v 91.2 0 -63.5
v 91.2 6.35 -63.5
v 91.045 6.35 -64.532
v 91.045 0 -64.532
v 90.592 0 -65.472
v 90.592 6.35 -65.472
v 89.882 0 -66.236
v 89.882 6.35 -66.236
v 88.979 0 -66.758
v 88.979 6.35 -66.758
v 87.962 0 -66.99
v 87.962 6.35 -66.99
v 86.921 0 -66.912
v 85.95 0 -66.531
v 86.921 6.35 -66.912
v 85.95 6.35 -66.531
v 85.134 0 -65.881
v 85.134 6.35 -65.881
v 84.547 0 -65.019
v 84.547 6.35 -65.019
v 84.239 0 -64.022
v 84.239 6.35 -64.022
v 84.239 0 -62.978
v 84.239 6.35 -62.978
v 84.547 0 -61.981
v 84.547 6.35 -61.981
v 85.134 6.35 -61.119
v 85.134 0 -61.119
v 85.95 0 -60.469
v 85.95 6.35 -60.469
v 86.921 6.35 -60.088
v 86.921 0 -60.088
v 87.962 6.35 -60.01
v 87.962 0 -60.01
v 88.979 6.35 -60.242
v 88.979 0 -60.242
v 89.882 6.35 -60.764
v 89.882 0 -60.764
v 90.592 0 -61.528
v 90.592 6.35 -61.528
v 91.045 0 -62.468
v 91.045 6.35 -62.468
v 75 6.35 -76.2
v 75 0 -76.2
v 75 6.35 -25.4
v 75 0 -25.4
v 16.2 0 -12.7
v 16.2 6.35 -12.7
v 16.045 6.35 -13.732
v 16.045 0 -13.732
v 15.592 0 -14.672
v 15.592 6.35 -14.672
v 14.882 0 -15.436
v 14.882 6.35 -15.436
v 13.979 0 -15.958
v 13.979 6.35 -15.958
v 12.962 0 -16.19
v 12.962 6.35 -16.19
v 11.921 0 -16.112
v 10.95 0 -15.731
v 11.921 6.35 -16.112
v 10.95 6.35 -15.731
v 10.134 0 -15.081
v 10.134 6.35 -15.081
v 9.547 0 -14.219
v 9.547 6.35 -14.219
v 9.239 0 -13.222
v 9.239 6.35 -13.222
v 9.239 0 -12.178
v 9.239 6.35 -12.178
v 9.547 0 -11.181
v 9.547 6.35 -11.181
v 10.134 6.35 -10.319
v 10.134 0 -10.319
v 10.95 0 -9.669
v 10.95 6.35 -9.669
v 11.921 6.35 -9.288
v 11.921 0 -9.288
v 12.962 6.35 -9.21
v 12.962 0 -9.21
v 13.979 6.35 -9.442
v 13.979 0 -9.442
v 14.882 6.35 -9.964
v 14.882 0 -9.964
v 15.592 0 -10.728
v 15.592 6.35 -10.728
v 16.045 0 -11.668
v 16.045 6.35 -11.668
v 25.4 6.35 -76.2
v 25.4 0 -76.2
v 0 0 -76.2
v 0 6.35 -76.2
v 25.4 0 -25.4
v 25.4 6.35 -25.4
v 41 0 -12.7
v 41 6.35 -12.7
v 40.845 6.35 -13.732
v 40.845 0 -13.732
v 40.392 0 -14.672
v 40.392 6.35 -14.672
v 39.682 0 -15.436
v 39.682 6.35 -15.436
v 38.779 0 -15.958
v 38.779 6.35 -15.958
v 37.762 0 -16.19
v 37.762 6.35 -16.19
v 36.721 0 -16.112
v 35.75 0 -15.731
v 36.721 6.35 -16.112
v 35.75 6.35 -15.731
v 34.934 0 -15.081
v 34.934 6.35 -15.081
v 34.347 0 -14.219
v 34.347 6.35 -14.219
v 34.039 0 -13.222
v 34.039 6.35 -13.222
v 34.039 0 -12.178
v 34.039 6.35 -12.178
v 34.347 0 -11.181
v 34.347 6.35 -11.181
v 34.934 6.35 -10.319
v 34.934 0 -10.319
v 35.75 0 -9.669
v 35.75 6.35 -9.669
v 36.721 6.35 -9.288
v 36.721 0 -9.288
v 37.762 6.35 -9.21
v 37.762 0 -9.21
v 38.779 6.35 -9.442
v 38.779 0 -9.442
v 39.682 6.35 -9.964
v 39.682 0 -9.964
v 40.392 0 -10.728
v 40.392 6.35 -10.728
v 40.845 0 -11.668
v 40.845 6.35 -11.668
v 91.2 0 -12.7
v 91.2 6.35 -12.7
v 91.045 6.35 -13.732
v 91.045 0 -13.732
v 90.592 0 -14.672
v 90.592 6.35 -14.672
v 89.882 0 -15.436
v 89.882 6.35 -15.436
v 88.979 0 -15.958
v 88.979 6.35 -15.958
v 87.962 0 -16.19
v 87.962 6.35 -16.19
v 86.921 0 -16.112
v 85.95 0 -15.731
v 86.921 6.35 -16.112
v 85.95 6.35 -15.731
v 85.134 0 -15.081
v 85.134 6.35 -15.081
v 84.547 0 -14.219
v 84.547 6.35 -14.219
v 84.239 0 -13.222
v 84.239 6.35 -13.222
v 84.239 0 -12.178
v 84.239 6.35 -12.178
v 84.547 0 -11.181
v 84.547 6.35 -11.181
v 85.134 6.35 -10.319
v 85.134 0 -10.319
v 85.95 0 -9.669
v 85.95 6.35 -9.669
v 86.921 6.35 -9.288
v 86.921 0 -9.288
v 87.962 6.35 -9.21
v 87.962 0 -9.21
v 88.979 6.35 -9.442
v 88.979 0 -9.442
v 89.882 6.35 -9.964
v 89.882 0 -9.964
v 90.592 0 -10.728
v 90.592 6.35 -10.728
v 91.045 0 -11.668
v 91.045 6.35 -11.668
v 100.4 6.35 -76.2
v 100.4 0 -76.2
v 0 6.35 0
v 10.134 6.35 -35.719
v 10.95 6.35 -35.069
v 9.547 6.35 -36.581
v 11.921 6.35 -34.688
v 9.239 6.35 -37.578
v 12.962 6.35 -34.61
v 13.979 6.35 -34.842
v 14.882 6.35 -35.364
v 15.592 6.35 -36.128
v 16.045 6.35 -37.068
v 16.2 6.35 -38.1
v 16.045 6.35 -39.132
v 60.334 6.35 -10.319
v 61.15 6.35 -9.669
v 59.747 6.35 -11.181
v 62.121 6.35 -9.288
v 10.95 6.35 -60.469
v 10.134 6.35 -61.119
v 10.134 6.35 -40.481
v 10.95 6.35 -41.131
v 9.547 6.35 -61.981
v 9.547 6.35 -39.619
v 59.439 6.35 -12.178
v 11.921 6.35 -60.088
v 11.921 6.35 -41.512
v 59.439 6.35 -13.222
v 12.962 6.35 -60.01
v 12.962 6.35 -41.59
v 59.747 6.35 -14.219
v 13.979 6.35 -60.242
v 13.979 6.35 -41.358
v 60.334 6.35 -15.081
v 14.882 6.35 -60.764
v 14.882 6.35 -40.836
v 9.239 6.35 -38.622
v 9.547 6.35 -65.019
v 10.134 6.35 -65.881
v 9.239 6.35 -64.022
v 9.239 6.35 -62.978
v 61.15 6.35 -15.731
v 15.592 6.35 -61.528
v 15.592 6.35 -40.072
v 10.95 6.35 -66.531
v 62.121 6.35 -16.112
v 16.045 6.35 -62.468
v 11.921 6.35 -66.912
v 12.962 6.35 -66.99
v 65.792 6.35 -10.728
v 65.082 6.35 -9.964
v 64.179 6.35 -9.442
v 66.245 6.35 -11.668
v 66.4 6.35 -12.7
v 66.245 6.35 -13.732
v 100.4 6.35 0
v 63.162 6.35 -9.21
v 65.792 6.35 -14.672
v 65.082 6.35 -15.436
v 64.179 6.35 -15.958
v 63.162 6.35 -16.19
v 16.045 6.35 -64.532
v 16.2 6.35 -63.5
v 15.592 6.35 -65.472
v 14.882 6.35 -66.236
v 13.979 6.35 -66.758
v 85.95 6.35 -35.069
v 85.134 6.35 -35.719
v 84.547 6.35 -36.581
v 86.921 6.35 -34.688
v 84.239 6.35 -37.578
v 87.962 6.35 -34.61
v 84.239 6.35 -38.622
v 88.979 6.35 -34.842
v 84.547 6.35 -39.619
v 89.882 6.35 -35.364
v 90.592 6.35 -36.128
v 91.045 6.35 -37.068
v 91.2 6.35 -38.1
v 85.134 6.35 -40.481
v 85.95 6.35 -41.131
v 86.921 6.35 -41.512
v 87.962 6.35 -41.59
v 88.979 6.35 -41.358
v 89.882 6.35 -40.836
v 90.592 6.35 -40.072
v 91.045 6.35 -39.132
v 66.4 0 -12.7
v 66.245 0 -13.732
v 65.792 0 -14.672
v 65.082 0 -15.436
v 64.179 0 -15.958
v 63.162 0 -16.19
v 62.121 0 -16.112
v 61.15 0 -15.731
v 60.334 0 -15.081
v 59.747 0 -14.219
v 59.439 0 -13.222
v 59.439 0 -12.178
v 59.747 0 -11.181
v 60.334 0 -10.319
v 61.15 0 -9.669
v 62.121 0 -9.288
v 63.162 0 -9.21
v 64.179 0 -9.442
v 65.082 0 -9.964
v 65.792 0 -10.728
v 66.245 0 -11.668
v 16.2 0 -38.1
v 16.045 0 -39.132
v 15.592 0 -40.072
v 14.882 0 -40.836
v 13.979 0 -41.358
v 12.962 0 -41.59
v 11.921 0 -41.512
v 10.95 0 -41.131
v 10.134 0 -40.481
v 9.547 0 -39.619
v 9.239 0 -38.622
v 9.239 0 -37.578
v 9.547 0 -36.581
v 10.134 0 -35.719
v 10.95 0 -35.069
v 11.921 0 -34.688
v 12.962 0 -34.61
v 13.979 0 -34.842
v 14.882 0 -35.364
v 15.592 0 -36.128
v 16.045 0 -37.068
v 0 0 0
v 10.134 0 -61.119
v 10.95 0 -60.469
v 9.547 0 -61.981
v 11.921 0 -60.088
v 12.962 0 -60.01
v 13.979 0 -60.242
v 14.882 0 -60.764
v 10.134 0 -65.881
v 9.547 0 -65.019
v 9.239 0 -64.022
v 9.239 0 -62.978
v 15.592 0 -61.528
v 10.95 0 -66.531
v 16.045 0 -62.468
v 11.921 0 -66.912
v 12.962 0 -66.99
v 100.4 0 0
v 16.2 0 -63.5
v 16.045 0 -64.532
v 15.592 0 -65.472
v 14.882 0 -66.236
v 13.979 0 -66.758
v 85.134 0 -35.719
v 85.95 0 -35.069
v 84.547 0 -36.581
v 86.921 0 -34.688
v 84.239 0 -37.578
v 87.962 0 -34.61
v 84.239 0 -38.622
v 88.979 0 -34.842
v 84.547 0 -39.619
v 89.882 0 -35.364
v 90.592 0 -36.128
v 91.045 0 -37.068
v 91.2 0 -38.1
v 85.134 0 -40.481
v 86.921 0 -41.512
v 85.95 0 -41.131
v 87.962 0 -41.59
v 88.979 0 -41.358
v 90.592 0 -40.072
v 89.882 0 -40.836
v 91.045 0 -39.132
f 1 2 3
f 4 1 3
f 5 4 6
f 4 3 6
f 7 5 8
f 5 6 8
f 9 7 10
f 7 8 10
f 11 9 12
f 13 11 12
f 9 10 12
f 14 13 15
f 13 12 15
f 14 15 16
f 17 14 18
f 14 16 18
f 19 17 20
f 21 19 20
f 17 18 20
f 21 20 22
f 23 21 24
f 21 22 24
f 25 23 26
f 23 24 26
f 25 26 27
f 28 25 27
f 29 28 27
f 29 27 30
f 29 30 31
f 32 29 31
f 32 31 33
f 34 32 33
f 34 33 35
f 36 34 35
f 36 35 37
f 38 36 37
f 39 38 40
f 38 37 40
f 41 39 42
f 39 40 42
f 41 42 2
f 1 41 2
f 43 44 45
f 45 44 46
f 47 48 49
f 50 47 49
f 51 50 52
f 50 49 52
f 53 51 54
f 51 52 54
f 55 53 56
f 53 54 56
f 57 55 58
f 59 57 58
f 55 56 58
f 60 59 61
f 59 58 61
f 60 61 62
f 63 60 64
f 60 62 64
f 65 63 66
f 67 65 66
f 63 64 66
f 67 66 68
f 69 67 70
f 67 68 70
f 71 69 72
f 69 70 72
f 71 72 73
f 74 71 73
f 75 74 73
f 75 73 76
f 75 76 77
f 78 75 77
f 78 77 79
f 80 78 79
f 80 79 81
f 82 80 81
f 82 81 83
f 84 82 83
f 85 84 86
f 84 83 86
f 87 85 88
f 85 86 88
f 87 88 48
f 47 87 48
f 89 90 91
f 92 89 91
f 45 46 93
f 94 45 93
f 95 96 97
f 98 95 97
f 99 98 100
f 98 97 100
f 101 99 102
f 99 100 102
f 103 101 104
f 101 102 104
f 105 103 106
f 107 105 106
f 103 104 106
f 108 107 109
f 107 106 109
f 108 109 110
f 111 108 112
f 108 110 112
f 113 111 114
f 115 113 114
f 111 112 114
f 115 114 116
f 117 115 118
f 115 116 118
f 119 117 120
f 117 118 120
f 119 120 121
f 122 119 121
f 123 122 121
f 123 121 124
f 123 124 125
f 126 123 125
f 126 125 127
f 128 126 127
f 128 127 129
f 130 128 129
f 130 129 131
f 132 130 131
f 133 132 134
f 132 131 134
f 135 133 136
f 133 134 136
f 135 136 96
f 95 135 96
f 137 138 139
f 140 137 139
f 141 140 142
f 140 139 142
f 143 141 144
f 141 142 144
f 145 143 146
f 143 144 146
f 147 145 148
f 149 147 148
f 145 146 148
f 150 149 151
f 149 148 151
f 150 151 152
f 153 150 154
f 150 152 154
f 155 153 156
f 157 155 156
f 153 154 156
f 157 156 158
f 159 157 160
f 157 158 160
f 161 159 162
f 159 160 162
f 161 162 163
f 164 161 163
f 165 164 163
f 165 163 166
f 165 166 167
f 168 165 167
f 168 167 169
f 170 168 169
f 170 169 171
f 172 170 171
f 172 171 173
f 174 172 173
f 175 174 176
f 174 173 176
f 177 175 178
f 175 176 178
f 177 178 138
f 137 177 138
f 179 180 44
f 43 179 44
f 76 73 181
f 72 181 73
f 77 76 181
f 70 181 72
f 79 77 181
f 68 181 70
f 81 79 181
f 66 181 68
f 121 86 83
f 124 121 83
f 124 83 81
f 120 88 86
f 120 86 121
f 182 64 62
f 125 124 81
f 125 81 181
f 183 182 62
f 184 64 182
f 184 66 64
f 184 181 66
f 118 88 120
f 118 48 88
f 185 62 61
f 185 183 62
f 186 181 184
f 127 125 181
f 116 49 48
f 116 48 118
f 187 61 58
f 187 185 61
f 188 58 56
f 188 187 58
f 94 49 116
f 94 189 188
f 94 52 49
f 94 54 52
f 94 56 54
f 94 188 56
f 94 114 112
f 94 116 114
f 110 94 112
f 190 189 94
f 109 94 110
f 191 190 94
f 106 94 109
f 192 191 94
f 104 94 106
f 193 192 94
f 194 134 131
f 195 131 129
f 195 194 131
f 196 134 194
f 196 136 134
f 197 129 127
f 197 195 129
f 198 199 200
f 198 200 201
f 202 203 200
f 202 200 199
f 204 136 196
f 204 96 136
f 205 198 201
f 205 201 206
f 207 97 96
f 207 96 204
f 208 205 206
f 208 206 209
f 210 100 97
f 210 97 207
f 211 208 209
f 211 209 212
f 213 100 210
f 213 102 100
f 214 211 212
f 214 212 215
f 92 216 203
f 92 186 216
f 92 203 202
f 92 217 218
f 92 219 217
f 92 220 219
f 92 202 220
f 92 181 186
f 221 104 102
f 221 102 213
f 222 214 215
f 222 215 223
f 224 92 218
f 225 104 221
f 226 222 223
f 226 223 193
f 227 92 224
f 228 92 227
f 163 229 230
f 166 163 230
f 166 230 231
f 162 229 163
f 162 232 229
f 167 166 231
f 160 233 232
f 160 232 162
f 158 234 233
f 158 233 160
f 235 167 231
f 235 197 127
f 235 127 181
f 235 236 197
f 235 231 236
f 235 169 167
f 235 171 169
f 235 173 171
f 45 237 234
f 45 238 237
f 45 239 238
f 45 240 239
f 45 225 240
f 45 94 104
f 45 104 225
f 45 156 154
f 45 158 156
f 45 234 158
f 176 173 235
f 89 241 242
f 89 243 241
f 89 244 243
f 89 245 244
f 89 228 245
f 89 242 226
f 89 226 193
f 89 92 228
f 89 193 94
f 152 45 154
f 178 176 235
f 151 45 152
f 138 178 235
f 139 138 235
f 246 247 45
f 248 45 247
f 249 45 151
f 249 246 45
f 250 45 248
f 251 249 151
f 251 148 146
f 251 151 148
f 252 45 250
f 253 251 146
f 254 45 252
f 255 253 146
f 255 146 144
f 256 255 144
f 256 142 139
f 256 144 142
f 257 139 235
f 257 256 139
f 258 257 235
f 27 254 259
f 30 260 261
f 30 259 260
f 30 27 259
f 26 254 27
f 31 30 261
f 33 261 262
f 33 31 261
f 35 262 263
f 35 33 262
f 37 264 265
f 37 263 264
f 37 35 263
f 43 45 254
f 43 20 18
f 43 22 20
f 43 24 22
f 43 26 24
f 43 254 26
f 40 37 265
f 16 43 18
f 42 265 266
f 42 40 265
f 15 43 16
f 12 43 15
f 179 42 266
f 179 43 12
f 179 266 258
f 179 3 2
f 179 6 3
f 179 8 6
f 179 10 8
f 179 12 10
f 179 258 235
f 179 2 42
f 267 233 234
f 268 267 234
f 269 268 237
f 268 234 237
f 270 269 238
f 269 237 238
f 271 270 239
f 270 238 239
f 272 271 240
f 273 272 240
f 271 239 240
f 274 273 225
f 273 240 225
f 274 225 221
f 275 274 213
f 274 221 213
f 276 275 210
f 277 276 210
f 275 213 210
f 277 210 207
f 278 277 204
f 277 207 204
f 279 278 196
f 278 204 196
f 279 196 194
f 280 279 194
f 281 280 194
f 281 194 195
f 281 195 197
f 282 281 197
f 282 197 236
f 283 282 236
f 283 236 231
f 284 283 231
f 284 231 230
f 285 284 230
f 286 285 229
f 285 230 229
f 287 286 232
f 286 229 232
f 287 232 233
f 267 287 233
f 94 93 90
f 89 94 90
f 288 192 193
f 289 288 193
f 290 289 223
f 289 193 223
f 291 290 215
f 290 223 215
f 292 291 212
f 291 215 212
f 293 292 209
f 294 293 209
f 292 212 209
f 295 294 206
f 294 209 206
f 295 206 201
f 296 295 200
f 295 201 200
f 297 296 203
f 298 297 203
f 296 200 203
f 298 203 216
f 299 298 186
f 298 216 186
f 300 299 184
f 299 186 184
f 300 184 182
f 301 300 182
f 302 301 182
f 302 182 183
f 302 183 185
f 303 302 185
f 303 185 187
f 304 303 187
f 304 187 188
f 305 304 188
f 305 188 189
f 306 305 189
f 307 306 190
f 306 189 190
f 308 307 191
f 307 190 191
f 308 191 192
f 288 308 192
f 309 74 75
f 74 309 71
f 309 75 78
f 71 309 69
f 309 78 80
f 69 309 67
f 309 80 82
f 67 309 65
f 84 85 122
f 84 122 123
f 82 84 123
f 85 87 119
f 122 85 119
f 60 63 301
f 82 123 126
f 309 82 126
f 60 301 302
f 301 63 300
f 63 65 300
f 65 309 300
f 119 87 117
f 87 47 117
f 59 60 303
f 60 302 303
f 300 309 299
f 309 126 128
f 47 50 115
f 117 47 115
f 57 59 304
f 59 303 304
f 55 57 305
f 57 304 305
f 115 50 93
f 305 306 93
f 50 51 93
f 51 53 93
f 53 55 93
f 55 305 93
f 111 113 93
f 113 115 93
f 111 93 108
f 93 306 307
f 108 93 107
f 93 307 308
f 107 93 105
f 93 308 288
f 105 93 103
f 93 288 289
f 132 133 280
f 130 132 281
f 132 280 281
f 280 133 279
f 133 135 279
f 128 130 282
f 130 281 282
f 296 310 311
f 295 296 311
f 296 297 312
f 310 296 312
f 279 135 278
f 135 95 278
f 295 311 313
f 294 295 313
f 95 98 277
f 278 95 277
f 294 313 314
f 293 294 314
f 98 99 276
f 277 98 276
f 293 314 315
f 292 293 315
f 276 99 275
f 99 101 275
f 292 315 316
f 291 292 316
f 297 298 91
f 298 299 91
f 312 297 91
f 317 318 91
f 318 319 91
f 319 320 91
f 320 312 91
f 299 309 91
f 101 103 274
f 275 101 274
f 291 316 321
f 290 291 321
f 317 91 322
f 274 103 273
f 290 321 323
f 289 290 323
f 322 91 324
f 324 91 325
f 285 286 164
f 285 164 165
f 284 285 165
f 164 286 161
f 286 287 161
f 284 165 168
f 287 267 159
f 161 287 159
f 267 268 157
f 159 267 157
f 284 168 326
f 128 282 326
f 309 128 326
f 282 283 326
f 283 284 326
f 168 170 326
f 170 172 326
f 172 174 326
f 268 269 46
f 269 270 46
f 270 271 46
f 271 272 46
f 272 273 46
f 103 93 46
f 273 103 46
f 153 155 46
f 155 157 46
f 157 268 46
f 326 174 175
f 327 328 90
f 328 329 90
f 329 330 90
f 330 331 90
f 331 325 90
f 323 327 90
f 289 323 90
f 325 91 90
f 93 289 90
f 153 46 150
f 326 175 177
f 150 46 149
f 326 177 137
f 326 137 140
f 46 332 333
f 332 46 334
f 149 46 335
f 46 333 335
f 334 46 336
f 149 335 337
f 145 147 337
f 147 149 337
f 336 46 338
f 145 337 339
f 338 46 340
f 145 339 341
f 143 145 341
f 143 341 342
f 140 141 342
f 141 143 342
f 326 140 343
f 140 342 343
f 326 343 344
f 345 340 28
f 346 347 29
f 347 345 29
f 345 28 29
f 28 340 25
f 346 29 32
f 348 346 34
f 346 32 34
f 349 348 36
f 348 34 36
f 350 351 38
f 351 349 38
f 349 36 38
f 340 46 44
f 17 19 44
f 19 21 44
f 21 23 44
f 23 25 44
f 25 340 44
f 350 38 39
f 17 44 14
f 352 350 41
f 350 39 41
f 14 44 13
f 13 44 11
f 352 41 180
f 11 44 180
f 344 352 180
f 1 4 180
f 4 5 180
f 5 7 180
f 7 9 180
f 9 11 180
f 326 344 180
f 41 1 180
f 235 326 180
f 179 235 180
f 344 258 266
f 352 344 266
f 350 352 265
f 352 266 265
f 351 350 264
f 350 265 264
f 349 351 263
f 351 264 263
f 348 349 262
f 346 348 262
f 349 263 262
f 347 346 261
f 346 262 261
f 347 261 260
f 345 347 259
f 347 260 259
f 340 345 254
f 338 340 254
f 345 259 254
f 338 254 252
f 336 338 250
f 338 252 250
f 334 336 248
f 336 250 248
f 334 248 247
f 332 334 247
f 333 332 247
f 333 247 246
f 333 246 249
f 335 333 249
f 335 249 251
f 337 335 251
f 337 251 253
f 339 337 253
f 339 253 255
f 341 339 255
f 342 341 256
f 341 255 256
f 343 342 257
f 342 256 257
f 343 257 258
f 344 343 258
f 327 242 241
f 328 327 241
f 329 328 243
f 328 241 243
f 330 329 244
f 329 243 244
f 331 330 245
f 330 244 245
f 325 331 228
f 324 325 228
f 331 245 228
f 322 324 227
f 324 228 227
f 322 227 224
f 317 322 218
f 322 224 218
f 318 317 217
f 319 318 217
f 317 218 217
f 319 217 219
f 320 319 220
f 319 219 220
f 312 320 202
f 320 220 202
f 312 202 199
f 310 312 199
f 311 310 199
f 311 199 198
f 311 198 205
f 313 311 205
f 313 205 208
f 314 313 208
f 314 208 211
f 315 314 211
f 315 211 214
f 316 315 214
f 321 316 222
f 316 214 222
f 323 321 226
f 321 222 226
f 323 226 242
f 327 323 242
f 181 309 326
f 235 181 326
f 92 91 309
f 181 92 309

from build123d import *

# Parameters (mm, degrees)
BOSS_EXTRUDE1_DEPTH = 6.35
SKETCH2_R           = 3.5
CUT_EXTRUDE1_DEPTH  = 6.35


with BuildPart() as part:
    # Sketch1 → Boss-Extrude1 (new body)
    with BuildSketch(Plane(origin=(0, 0, 0), x_dir=(1, 0, 0), z_dir=(0, 1, 0))):
        Polygon((0, 76.2), (0, 0), (25.4, 0), (75, 0), (100.4, 0), (100.4, 76.2), (75, 76.2), (75, 25.4), (25.4, 25.4), (25.4, 76.2), align=None)
    extrude(amount=BOSS_EXTRUDE1_DEPTH)

    # Sketch2 → Cut-Extrude1 (cut)
    with BuildSketch(Plane(origin=(0, 6.35, 0), x_dir=(1, 0, 0), z_dir=(0, 1, 0))):
        with Locations((12.7, 12.7)):
            Circle(SKETCH2_R)
        with Locations((12.7, 38.1)):
            Circle(SKETCH2_R)
        with Locations((12.7, 63.5)):
            Circle(SKETCH2_R)
        with Locations((87.7, 63.5)):
            Circle(SKETCH2_R)
        with Locations((87.7, 38.1)):
            Circle(SKETCH2_R)
        with Locations((87.7, 12.7)):
            Circle(SKETCH2_R)
        with Locations((37.5, 12.7)):
            Circle(SKETCH2_R)
        with Locations((62.9, 12.7)):
            Circle(SKETCH2_R)
    extrude(amount=-CUT_EXTRUDE1_DEPTH, mode=Mode.SUBTRACT)


solid = part.part
